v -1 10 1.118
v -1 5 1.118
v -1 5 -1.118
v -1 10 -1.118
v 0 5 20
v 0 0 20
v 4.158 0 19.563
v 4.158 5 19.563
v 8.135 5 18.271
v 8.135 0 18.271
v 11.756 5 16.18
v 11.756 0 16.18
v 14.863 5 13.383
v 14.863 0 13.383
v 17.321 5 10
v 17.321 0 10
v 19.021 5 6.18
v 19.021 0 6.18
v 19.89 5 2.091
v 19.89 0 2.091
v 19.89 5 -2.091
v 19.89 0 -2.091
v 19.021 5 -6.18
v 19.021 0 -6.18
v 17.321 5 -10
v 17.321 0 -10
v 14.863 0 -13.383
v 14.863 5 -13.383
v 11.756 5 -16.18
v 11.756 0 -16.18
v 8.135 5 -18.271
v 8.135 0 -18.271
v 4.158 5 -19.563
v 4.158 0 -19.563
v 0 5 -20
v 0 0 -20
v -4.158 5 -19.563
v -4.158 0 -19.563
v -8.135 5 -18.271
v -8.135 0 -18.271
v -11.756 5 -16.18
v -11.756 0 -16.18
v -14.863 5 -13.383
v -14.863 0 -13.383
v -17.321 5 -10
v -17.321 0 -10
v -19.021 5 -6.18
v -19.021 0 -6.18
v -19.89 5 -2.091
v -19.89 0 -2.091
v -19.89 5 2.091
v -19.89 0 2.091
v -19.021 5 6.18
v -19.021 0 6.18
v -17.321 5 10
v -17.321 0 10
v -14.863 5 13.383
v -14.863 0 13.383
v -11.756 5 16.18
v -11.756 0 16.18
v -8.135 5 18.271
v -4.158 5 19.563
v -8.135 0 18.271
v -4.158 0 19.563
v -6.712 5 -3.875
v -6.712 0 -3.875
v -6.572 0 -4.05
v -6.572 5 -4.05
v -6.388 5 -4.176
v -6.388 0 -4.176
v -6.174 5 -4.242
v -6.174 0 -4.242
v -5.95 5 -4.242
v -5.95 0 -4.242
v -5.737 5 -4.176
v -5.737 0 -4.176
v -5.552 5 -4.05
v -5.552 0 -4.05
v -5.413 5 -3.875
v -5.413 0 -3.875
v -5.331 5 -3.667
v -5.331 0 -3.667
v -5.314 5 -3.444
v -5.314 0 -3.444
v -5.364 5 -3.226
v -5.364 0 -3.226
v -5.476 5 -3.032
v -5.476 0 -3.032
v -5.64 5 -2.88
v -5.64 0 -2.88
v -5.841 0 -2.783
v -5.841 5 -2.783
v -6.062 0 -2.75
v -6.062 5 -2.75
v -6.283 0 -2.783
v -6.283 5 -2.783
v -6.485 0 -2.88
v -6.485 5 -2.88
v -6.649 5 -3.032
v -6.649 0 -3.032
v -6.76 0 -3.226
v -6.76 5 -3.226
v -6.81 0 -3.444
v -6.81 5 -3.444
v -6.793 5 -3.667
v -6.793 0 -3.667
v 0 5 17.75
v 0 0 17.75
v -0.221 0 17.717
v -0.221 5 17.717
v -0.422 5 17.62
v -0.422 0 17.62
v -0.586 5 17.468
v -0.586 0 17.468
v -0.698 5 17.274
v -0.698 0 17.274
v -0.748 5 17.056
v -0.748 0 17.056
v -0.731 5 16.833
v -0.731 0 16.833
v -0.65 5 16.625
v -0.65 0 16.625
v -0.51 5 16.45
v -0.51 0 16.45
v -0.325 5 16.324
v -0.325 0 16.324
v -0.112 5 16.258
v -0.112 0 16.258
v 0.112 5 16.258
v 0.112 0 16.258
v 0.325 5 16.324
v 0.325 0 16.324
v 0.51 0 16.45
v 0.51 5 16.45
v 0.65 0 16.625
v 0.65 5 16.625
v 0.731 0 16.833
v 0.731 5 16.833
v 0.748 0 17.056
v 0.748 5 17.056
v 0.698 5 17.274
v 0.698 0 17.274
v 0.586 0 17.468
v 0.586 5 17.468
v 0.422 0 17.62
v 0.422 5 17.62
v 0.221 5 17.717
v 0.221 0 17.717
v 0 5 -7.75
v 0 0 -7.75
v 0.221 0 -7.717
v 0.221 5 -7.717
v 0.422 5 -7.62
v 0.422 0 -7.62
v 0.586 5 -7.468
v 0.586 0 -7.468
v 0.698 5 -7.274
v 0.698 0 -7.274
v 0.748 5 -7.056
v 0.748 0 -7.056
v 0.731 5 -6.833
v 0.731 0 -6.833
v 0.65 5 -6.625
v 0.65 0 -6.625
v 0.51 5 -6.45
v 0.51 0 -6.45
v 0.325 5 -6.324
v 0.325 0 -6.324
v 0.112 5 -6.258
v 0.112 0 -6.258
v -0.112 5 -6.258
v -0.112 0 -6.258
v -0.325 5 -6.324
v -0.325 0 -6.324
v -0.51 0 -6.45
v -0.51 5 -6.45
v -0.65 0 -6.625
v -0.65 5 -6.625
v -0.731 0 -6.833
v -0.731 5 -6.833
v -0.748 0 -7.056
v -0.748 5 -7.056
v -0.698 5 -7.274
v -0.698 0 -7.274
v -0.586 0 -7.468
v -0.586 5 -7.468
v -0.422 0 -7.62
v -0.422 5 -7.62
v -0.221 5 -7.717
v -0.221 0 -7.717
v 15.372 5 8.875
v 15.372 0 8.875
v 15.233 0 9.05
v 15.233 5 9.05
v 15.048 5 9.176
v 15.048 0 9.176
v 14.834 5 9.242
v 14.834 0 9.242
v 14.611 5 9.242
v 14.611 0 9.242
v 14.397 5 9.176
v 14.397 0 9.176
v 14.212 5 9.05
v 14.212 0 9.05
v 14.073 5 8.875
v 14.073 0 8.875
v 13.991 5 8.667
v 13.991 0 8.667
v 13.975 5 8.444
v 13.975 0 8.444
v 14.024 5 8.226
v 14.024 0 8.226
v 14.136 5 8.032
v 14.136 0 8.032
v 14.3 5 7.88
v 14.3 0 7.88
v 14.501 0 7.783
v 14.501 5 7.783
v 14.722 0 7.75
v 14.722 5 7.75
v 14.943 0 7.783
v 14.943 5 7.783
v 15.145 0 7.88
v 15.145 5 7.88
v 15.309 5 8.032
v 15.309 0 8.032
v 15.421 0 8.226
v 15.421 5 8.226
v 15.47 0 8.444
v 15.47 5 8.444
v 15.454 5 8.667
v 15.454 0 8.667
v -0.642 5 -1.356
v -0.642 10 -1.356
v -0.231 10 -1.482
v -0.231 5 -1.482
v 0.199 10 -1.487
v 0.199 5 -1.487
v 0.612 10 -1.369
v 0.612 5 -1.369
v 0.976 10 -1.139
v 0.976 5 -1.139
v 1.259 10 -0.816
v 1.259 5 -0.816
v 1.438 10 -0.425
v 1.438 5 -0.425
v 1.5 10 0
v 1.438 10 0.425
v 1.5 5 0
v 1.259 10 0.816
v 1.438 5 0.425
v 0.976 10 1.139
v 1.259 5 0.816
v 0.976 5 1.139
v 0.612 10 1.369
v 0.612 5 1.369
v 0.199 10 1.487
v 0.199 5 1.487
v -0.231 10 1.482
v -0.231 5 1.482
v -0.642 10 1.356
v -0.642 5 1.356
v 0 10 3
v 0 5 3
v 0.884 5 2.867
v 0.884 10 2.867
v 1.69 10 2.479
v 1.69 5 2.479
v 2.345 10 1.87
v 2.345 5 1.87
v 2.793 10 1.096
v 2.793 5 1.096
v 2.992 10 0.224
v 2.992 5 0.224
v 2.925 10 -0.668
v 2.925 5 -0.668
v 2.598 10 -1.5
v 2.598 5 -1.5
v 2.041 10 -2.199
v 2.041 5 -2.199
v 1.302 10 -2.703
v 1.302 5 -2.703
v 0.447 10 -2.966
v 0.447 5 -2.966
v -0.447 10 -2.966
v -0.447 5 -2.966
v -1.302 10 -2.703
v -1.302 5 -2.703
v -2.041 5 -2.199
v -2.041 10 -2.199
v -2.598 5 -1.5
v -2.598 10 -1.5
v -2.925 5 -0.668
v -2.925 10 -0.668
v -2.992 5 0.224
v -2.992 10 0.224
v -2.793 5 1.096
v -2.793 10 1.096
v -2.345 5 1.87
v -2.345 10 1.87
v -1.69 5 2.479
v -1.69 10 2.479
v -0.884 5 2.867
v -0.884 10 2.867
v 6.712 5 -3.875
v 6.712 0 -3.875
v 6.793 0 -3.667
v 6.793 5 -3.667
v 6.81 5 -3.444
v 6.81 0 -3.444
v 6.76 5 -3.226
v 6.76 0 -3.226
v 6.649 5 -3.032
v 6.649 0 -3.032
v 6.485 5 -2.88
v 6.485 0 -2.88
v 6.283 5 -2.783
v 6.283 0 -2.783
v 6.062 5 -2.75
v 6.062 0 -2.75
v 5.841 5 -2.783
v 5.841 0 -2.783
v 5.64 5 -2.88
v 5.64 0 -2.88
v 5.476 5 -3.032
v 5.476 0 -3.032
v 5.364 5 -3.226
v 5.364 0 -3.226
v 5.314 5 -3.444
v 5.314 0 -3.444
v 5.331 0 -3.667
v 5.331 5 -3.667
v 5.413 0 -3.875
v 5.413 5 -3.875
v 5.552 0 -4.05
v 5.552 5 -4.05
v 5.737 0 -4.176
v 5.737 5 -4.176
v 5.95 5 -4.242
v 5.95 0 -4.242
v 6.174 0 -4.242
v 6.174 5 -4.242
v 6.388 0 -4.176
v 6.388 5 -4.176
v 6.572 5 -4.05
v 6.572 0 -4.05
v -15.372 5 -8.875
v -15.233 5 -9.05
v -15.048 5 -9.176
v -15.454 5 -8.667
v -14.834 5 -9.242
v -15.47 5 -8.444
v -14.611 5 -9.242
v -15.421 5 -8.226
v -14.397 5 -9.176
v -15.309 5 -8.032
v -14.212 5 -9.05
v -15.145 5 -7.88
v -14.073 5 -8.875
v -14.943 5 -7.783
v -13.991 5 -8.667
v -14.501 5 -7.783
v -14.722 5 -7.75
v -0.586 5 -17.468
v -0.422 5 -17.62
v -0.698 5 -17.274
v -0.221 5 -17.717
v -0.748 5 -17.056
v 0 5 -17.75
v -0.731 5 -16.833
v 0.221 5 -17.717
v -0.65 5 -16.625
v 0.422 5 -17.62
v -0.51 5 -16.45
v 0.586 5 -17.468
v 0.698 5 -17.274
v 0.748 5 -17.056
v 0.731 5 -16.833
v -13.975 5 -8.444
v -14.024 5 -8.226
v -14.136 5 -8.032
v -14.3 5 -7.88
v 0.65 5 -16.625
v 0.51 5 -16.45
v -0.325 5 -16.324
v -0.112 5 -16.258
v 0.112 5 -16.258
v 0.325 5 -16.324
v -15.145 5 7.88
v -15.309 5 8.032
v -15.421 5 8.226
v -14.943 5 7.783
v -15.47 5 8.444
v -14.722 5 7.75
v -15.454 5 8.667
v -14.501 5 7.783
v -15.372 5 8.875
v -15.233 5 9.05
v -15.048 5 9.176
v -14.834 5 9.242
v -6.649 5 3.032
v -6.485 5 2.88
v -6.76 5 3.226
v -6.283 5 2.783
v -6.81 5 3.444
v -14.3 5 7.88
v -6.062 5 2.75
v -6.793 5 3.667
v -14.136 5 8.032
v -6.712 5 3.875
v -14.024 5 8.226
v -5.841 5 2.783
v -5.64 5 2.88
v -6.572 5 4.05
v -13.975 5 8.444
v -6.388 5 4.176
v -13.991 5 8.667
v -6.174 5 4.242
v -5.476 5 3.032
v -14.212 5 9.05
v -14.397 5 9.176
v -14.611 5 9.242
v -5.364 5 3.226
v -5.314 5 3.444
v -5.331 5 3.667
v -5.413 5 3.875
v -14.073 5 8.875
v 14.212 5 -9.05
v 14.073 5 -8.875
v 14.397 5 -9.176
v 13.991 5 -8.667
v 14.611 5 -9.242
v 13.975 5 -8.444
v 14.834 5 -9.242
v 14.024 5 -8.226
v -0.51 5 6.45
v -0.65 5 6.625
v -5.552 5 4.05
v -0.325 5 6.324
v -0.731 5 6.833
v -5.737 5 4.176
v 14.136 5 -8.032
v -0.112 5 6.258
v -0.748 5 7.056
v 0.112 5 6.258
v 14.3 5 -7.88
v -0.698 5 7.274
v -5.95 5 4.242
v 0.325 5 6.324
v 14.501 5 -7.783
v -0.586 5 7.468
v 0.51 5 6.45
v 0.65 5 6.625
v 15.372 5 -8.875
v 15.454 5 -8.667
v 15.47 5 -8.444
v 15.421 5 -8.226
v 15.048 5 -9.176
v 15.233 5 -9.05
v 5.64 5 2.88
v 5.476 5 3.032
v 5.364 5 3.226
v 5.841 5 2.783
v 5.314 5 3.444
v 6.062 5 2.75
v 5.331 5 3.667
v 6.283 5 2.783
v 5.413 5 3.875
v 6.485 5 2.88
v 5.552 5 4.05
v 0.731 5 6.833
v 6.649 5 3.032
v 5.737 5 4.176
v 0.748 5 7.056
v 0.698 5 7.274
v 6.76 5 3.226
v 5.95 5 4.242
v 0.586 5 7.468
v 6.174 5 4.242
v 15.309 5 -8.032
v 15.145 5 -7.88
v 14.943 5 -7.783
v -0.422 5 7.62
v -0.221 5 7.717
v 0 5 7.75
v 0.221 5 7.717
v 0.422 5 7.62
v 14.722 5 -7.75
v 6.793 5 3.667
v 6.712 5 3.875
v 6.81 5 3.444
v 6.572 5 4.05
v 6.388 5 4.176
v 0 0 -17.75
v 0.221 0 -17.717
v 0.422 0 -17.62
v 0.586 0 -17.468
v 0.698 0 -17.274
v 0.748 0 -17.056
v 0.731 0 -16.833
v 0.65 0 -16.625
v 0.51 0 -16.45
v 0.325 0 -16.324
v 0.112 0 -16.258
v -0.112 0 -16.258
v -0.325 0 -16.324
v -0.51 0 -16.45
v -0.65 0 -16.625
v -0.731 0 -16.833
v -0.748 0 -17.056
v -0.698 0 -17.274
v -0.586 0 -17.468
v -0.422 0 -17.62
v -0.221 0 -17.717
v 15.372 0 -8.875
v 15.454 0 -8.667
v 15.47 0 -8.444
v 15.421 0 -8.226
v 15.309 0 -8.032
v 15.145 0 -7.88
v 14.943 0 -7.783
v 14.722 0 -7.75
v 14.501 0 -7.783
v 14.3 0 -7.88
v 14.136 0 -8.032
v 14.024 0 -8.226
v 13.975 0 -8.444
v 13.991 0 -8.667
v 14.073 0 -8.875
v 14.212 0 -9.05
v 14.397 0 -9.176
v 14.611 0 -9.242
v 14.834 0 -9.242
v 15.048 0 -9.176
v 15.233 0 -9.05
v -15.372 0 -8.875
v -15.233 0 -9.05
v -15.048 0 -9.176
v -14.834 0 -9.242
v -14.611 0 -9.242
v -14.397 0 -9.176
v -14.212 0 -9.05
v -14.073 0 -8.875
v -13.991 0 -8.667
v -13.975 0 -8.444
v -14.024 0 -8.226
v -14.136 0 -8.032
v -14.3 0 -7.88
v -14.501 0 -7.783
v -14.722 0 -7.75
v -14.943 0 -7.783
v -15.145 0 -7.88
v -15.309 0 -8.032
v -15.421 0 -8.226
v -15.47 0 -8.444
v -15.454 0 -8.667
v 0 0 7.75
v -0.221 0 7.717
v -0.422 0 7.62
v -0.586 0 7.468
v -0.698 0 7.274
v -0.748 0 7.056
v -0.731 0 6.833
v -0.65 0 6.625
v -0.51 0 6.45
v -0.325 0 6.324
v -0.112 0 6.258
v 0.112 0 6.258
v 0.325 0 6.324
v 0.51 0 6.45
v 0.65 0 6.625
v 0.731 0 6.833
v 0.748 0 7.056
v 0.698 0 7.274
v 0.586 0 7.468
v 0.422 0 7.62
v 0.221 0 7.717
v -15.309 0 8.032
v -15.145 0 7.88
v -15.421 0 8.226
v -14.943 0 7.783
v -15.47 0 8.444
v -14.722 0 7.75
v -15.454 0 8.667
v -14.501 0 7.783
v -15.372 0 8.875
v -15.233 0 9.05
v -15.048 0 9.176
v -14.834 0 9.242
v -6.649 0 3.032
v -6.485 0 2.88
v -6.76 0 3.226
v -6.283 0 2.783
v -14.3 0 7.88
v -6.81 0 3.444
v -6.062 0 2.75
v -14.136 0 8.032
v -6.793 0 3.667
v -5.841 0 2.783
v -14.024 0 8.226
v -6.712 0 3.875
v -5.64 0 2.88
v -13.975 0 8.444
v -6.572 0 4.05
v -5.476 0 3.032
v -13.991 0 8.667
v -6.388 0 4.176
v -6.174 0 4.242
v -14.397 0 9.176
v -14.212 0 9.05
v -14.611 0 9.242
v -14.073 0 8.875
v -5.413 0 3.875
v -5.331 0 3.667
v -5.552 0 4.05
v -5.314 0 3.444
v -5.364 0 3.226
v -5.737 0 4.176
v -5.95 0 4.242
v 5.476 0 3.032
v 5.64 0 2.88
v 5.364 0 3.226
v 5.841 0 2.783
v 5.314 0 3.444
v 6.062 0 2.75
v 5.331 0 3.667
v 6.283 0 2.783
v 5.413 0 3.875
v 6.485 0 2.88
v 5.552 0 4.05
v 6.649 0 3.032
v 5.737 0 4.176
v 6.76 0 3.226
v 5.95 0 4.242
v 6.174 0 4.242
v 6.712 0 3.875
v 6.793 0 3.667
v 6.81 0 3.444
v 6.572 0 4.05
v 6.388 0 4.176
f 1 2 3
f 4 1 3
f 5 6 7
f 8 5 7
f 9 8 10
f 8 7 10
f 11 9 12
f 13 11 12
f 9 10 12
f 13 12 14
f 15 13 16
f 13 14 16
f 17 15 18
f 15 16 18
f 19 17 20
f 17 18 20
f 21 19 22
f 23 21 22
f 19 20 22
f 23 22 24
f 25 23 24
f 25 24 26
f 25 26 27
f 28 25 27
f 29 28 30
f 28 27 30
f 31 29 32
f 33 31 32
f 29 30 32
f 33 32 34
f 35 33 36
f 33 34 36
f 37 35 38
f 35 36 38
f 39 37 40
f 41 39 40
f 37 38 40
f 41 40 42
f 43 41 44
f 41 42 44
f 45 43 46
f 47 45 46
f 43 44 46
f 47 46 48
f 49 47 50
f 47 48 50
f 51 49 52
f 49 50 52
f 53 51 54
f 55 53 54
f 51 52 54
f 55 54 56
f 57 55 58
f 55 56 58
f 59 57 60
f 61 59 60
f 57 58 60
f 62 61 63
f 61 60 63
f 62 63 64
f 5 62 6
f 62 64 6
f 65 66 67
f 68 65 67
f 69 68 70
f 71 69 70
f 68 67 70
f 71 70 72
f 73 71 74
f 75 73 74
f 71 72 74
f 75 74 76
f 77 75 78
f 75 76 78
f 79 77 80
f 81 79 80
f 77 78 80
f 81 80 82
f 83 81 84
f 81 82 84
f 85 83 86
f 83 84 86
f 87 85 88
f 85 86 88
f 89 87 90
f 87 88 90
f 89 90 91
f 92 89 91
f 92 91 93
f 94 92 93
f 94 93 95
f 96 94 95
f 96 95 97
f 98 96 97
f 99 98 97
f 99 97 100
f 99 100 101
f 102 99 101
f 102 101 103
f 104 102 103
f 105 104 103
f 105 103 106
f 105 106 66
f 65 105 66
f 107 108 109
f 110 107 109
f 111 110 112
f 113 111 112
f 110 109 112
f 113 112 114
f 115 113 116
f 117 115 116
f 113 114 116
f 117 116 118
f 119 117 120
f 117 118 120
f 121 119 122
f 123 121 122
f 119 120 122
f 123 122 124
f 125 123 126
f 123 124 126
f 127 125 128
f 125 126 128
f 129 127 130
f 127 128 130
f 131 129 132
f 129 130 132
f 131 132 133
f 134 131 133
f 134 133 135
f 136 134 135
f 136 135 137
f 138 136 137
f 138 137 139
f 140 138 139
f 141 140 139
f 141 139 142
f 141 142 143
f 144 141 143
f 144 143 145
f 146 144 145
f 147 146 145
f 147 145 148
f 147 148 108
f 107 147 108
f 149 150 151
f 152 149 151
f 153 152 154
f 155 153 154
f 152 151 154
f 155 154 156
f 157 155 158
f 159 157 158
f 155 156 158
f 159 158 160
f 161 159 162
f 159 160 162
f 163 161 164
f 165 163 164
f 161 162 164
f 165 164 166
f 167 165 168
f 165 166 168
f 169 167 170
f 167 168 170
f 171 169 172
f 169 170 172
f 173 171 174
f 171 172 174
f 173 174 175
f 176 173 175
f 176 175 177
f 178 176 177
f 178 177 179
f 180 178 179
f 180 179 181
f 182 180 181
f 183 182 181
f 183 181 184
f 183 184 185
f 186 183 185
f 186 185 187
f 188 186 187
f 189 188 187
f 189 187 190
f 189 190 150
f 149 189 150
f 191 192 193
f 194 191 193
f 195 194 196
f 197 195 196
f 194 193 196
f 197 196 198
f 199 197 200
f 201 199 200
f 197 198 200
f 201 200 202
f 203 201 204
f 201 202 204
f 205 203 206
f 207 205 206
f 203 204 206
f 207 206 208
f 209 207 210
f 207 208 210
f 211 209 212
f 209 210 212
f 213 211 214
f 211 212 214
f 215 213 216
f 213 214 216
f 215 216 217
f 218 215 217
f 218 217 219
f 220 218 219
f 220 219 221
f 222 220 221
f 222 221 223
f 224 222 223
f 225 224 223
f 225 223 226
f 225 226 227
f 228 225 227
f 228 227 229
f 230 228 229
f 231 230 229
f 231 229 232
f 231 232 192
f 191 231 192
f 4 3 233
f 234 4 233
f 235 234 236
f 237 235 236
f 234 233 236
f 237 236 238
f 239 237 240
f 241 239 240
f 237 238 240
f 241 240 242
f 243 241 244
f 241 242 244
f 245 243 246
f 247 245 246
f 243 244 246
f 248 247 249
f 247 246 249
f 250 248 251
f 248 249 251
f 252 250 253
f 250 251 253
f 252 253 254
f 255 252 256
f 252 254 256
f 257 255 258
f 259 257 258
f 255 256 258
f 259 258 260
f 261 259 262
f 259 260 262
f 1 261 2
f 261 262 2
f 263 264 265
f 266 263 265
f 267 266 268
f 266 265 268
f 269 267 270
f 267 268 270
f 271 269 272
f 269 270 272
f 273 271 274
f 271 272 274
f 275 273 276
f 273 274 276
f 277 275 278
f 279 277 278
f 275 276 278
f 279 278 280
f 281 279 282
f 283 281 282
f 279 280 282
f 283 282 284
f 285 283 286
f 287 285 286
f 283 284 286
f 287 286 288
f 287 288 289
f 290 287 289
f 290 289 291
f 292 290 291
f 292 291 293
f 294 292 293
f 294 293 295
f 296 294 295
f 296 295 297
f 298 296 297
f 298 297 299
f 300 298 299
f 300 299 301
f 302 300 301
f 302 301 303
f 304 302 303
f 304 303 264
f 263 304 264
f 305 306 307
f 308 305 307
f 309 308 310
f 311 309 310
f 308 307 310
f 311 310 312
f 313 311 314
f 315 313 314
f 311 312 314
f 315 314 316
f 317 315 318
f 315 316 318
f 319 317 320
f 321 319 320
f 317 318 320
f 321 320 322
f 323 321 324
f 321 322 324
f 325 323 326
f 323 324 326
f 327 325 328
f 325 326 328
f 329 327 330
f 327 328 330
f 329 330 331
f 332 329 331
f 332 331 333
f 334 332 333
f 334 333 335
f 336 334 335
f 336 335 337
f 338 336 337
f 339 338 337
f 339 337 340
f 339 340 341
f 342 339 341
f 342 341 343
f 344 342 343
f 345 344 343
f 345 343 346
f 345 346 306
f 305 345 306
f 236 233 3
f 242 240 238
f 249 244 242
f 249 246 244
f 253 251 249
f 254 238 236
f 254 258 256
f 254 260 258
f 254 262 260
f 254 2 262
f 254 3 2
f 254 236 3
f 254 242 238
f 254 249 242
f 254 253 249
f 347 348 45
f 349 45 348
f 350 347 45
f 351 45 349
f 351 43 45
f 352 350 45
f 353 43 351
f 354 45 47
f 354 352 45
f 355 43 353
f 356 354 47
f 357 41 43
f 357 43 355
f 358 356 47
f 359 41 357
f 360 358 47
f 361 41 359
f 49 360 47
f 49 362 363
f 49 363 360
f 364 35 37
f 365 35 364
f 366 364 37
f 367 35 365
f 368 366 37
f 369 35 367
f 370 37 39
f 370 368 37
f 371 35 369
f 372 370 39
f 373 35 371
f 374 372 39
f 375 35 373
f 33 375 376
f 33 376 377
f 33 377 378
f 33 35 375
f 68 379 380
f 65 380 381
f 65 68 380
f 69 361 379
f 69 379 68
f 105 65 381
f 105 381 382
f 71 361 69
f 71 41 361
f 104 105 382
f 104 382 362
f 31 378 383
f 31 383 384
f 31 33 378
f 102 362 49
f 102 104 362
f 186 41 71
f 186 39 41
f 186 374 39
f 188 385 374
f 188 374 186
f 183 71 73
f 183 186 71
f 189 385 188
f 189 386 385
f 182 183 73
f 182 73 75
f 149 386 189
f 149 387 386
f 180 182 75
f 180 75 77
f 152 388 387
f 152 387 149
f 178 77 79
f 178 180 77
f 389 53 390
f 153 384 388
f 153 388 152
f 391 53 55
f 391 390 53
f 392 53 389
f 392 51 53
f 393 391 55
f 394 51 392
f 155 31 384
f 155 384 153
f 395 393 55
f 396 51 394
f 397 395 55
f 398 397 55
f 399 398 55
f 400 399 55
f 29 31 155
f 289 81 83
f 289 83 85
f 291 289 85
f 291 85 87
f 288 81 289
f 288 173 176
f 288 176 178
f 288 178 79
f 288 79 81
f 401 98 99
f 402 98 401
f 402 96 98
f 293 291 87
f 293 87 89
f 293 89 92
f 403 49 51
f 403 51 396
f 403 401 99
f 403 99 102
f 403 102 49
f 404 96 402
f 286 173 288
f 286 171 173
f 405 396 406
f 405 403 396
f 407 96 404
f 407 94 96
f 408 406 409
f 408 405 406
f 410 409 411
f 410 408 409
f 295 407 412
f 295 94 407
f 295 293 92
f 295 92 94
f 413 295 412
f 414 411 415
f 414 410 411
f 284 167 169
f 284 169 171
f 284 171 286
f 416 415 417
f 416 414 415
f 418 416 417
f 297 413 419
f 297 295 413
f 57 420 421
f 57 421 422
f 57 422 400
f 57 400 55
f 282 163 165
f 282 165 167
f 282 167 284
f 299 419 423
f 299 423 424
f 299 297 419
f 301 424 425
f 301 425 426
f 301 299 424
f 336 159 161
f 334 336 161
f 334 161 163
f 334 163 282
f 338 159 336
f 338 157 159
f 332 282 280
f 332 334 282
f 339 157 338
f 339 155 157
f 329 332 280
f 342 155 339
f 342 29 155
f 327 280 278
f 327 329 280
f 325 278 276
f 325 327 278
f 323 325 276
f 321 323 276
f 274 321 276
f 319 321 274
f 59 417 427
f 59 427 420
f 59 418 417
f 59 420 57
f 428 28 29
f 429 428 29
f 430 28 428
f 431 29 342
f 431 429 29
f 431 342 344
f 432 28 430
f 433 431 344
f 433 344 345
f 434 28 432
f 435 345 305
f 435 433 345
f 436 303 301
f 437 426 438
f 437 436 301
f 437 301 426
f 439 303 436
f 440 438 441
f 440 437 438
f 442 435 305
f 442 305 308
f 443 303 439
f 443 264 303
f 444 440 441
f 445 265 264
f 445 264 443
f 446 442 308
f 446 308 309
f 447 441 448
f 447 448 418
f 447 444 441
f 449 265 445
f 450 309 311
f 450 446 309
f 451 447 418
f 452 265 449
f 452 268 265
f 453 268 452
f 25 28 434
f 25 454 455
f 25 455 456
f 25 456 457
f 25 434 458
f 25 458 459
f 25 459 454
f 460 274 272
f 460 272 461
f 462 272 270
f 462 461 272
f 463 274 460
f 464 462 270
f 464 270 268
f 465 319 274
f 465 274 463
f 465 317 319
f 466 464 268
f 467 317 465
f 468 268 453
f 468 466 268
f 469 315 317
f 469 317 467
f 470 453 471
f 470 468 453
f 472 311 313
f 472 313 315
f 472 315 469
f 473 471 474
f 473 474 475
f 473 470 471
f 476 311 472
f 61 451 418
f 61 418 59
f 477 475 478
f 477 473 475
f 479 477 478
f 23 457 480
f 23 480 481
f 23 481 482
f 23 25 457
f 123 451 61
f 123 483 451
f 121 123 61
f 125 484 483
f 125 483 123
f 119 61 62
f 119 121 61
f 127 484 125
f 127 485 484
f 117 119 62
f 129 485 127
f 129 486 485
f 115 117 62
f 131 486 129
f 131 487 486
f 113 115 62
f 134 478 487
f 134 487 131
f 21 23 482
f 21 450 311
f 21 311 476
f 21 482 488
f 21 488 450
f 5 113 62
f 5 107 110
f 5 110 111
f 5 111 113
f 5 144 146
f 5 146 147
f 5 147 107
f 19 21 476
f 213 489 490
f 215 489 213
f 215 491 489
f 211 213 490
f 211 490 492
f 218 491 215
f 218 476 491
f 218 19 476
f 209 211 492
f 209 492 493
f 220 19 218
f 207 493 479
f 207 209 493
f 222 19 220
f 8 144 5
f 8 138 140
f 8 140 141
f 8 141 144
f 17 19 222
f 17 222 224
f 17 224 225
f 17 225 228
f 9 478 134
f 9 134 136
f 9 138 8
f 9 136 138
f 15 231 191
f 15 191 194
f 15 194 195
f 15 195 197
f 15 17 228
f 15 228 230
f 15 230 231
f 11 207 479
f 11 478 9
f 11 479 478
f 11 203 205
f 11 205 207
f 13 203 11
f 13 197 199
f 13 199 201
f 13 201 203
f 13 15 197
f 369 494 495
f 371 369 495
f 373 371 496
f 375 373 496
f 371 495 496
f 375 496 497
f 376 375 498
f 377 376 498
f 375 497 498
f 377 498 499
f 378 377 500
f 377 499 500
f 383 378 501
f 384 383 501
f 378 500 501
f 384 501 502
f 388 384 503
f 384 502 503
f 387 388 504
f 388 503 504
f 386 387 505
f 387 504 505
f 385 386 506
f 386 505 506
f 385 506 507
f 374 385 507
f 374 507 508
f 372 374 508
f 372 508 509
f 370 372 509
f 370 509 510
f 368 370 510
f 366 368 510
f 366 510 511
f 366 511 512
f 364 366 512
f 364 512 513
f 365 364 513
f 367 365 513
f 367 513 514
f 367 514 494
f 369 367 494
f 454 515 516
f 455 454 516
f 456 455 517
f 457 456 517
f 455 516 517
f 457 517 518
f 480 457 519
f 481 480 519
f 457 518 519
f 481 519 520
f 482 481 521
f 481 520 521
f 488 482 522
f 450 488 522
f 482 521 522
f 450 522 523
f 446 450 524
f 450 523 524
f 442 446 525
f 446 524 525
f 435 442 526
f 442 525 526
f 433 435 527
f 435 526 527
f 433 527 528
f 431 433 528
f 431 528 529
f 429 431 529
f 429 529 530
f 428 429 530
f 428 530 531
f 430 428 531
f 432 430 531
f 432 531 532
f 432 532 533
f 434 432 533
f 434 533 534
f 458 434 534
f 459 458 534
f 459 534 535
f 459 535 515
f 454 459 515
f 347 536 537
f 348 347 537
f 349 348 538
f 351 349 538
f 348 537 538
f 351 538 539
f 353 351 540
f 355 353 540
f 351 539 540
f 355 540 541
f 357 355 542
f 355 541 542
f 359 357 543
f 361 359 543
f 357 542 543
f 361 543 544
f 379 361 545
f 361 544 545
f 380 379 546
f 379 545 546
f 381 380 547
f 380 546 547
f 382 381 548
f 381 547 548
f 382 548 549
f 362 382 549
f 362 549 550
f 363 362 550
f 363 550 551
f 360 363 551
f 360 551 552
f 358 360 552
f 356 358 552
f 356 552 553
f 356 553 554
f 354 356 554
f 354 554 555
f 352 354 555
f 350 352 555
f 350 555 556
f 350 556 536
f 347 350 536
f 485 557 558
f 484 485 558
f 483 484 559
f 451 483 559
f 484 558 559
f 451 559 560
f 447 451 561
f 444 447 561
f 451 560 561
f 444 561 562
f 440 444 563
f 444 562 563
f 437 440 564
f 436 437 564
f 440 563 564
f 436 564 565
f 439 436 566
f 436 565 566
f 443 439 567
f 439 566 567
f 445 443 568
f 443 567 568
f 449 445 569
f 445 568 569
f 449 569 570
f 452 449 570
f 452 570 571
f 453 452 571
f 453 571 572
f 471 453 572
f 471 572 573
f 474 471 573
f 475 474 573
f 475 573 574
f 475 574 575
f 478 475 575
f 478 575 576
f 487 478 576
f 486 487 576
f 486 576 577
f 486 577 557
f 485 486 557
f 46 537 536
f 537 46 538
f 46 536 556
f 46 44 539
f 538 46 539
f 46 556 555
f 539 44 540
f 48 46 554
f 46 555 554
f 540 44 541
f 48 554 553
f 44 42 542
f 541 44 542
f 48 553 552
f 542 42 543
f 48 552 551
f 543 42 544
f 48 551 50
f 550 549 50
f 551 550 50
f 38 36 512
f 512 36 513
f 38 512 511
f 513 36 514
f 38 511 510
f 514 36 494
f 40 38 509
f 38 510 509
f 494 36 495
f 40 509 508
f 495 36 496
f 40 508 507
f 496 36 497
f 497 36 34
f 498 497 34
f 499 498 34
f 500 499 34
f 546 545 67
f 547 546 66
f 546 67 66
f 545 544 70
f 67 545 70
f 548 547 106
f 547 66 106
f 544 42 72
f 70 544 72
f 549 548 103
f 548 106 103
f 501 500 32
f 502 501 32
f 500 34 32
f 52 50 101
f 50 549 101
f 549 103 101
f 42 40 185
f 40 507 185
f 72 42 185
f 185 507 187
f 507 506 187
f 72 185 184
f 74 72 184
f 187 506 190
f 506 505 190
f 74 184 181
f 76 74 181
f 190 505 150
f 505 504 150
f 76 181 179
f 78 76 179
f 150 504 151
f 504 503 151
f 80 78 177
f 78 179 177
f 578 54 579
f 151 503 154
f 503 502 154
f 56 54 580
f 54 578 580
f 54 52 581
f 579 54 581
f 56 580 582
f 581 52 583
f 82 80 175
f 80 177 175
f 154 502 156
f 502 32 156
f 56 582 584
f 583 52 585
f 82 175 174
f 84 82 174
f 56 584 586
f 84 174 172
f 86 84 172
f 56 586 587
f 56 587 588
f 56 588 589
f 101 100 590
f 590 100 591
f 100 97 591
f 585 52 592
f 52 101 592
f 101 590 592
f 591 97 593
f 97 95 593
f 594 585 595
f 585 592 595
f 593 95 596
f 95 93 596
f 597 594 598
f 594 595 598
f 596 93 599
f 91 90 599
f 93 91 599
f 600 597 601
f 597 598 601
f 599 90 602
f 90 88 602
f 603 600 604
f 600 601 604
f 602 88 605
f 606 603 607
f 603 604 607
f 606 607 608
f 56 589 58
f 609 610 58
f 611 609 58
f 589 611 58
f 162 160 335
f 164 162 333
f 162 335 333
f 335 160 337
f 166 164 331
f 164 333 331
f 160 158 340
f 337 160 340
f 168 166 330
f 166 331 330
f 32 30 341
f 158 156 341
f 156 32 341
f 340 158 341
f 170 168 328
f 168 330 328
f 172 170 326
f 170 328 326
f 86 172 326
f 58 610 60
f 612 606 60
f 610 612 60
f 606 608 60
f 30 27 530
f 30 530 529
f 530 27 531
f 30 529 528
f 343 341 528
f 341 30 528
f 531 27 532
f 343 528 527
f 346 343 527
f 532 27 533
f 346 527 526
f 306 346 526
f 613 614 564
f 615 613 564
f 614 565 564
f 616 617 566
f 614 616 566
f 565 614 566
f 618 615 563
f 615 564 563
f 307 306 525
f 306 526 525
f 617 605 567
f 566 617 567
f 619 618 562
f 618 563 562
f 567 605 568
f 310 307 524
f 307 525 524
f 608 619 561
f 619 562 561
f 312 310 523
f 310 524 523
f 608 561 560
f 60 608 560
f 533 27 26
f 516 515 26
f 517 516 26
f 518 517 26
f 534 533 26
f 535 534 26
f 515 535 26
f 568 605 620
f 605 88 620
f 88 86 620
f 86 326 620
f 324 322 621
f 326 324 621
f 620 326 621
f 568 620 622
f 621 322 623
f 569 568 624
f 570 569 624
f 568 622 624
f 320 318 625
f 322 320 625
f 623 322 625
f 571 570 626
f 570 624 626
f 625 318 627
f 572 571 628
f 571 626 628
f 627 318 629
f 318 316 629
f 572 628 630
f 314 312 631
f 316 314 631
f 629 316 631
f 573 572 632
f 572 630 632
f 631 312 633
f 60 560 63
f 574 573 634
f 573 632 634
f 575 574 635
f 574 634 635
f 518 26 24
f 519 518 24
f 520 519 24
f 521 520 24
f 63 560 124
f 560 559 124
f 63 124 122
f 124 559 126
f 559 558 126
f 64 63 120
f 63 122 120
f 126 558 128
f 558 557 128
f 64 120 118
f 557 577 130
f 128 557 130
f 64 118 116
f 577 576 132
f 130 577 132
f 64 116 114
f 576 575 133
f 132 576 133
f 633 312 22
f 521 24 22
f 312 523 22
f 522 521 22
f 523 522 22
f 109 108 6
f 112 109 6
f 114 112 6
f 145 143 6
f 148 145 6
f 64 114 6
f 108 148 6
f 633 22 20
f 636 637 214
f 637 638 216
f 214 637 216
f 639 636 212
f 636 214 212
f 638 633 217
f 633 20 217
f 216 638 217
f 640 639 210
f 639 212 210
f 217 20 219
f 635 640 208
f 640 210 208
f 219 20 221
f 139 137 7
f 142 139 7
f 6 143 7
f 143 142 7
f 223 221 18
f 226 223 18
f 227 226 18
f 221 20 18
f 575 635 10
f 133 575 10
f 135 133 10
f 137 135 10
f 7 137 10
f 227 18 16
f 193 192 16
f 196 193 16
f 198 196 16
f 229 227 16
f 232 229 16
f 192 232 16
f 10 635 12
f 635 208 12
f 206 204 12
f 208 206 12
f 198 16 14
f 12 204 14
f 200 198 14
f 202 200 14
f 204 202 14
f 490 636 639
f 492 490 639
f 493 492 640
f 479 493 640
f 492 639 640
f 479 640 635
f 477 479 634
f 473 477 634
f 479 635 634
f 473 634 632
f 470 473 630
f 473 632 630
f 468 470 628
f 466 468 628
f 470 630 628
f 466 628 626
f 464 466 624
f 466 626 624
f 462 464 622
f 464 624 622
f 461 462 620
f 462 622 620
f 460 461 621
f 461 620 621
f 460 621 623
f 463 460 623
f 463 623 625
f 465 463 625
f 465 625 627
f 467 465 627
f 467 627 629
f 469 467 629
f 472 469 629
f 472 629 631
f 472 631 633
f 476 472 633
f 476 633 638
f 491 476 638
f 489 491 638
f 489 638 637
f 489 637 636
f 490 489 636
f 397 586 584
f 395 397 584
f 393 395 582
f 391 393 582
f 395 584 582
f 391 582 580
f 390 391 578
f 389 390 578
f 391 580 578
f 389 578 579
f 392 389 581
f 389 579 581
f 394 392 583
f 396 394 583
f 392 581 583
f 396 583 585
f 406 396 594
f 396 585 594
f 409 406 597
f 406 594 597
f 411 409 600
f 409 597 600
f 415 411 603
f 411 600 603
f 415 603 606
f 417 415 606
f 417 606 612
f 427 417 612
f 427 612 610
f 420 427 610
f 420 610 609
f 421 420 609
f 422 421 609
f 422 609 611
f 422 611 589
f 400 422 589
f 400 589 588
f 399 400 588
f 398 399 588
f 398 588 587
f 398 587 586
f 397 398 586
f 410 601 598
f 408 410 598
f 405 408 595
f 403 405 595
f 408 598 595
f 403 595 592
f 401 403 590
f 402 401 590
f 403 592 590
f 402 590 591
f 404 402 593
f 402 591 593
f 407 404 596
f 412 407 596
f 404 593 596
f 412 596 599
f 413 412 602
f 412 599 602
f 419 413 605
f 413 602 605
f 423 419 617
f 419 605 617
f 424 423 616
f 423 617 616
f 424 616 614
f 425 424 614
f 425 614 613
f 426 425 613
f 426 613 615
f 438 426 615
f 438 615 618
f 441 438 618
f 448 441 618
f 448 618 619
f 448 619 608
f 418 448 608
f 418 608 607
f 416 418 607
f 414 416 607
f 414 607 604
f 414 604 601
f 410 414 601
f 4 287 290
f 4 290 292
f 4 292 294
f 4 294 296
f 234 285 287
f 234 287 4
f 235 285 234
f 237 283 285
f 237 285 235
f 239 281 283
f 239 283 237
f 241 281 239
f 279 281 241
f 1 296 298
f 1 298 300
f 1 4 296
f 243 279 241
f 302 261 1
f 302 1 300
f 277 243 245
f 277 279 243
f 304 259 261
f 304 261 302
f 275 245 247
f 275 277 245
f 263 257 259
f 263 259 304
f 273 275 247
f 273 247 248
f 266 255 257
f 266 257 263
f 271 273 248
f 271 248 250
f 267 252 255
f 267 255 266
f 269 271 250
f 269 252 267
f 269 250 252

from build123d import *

# Parameters (mm, degrees)
SKETCH_1_R               = 20
EXTRUDE_1_DEPTH          = 5
SKETCH_1_7_R             = 3
EXTRUDE_2_DEPTH          = 10
SKETCH_2_R               = 0.75
CUT_EXTRUDE_1_DEPTH      = 31
PATTERN_CIRCULAR_1_COUNT = 6


with BuildPart() as part:
    # 草图1 → 凸台-拉伸1 (new body)
    with BuildSketch(Plane(origin=(0, 0, 0), x_dir=(1, 0, 0), z_dir=(0, 1, 0))):
        Circle(SKETCH_1_R)
    extrude(amount=EXTRUDE_1_DEPTH)

    # 草图1<7> → 凸台-拉伸2 (add)
    with BuildSketch(Plane(origin=(0, 0, 0), x_dir=(1, 0, 0), z_dir=(0, 1, 0))):
        Circle(SKETCH_1_7_R)
        with BuildLine():
            Line((-1, -1.118033989), (-1, 1.118033989))
            ThreePointArc((-1, 1.118033989), (1.5, 0), (-1, -1.118033989))
        make_face(mode=Mode.SUBTRACT)
    extrude(amount=EXTRUDE_2_DEPTH)

    # 草图2 → 切除-拉伸1 (cut, through all)
    with BuildSketch(Plane.XZ):
        with Locations((0, -7)):
            Circle(SKETCH_2_R)
        with Locations((0, -17)):
            Circle(SKETCH_2_R)
    cut_extrude_1 = extrude(amount=-CUT_EXTRUDE_1_DEPTH, mode=Mode.SUBTRACT)

    # 阵列(圆周)1: 切除-拉伸1 ×6 about axis
    pattern_circular_1_axis = Axis((0, 5, 0), (0, -1, 0))
    for i in range(1, PATTERN_CIRCULAR_1_COUNT):
        add(cut_extrude_1.rotate(pattern_circular_1_axis, i * 360 / PATTERN_CIRCULAR_1_COUNT), mode=Mode.SUBTRACT)


solid = part.part
